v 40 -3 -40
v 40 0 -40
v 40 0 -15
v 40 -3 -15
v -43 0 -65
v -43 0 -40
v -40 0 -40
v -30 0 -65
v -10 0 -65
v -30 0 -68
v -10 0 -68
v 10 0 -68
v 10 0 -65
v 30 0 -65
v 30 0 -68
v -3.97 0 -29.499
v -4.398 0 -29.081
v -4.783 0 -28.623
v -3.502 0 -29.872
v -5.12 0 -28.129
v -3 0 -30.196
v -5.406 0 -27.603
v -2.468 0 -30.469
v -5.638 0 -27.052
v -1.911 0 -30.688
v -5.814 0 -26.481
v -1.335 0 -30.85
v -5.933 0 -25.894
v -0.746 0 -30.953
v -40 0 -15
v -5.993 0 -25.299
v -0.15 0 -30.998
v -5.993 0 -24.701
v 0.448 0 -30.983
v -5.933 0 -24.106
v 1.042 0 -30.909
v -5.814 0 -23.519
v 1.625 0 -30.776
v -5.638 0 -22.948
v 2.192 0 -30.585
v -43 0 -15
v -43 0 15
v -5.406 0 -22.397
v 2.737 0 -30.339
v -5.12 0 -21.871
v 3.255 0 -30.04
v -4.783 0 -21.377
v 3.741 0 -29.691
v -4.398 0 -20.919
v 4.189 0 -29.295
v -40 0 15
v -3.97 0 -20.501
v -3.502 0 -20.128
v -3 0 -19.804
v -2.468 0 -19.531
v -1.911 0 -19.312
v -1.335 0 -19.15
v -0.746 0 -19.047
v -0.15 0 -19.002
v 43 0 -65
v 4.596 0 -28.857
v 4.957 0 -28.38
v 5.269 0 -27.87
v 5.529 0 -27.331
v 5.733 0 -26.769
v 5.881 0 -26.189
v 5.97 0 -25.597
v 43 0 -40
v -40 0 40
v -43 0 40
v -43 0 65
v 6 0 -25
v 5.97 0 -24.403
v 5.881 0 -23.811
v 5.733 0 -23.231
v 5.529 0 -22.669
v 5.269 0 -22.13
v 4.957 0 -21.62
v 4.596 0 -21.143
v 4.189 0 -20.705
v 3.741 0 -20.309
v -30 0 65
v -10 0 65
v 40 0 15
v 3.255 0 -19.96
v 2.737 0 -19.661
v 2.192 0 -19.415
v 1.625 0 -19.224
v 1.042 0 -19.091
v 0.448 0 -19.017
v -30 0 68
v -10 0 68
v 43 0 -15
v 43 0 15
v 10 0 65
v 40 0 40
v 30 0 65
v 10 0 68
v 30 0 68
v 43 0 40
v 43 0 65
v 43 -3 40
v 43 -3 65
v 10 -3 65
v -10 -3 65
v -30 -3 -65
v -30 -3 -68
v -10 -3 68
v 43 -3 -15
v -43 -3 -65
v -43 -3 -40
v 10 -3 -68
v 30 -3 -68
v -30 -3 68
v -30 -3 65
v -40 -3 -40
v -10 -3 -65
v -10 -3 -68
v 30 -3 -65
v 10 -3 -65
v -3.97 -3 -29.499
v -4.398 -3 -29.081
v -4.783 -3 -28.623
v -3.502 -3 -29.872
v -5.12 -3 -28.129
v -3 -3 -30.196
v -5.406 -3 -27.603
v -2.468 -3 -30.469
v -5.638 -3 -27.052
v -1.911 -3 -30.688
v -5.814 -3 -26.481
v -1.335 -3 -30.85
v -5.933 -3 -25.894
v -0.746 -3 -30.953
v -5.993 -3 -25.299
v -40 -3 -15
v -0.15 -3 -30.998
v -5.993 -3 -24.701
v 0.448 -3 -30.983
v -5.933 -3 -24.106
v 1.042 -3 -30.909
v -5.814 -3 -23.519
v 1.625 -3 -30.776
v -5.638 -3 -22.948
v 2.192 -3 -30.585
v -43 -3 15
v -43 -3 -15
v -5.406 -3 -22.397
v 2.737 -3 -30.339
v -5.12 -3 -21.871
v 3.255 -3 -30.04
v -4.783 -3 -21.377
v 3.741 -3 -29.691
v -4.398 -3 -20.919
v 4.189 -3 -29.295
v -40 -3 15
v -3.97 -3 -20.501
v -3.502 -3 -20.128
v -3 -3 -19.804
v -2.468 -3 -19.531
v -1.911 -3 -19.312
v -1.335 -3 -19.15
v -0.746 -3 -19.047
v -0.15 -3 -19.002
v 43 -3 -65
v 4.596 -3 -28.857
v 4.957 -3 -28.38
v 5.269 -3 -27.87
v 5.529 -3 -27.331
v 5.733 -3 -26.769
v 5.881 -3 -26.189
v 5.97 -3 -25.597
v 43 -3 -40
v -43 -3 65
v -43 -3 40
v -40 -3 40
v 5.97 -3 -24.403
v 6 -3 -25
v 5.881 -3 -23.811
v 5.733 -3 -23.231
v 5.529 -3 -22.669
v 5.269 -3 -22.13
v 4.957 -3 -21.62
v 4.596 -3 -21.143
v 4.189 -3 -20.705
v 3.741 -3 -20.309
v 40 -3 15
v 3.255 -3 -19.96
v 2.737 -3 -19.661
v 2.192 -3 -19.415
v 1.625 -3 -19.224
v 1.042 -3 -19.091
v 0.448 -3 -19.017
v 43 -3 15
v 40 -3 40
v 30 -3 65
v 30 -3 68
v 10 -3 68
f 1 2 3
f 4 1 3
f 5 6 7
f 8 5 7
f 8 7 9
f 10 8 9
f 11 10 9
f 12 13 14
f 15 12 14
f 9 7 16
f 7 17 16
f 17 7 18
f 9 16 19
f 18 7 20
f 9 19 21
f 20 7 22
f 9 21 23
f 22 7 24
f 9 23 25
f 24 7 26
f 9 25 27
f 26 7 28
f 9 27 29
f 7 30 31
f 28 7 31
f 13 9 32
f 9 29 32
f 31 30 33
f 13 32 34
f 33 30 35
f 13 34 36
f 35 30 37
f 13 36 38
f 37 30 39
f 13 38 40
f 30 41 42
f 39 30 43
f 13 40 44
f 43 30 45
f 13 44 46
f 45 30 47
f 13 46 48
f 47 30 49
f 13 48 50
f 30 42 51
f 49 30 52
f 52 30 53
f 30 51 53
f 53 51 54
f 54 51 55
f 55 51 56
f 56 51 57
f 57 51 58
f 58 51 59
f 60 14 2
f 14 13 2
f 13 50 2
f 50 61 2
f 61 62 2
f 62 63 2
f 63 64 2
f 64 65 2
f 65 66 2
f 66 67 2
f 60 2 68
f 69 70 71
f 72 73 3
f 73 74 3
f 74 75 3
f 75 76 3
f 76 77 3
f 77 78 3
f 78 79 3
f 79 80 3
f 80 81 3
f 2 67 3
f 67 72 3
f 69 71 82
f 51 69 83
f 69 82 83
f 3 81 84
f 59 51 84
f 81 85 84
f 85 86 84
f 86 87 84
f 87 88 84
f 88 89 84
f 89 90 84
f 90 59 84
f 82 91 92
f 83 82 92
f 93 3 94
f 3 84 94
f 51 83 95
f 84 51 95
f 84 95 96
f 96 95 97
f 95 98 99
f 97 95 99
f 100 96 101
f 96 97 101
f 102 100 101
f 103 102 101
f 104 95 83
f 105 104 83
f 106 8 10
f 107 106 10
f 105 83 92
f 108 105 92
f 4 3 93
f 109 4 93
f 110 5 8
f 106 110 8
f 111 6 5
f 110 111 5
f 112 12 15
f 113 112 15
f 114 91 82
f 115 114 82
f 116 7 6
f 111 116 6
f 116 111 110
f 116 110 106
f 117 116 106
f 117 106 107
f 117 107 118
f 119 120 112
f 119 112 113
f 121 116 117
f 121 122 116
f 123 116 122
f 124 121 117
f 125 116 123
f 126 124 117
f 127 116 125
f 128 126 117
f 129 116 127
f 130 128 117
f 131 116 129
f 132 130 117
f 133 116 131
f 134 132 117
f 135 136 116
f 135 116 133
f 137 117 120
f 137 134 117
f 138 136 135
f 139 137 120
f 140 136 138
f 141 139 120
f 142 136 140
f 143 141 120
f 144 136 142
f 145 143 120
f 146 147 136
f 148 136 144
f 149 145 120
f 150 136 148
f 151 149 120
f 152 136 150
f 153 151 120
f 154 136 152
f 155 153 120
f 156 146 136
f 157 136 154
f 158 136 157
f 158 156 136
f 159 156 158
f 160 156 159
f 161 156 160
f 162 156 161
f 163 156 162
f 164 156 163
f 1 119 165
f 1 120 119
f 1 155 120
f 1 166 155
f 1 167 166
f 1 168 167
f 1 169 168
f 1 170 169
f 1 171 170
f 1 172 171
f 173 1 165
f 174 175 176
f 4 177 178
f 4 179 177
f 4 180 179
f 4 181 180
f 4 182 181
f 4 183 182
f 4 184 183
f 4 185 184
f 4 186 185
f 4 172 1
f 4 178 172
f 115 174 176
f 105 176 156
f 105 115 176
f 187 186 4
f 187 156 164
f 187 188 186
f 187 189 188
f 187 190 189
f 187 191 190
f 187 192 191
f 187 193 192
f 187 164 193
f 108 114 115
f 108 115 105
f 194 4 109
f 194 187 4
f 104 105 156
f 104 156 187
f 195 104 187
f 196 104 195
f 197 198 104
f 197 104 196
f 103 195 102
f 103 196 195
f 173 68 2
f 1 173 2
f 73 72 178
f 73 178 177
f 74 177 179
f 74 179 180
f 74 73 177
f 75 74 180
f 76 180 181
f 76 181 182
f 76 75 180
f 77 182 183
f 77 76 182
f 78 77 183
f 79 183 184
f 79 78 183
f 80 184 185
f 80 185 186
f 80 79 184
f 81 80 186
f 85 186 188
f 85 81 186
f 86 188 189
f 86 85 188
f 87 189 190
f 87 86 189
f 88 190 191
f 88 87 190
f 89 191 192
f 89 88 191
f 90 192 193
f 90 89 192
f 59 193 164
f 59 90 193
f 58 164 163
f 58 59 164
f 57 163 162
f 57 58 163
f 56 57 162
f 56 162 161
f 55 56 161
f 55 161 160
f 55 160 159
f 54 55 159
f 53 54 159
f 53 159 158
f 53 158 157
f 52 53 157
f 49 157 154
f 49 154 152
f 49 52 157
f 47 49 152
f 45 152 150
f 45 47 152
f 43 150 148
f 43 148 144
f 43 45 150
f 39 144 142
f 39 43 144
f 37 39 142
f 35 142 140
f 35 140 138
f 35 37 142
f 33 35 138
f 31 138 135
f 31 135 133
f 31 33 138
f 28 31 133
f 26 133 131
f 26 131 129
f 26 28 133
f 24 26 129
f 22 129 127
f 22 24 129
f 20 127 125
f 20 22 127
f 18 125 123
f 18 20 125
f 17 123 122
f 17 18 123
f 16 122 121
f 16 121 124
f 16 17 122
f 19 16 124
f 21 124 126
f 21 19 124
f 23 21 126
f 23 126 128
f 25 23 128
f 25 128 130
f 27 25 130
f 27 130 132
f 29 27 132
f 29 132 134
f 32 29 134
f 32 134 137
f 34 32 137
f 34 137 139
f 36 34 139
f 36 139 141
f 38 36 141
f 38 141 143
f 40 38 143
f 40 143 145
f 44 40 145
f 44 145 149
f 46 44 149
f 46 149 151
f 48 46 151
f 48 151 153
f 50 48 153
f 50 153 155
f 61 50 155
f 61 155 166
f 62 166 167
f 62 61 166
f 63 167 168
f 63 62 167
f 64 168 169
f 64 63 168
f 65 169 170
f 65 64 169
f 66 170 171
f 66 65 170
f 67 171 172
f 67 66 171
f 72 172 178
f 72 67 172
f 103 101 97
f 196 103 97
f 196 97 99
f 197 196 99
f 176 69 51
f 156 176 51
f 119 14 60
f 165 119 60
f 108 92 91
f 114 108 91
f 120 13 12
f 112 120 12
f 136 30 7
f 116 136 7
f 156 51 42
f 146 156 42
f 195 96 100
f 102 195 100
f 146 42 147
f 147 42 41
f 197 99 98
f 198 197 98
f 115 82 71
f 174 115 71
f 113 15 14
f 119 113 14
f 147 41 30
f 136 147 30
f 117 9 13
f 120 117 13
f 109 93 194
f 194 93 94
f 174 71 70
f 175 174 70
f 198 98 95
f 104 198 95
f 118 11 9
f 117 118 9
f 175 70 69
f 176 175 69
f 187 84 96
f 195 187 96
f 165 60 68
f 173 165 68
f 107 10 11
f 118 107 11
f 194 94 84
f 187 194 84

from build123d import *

# Parameters (mm, degrees)
F0_R     = 6
F1_DEPTH = 3


with BuildPart() as f1:
    # F0 (on Front) → F1 (new body)
    with BuildSketch(Plane.XZ):
        Polygon((-30, 65), (-40, 65), (-43, 65), (-43, 40), (-40, 40), (-40, 15), (-43, 15), (-43, 0), (-43, -15), (-40, -15), (-40, -40), (-43, -40), (-43, -65), (-40, -65), (-30, -65), (-30, -68), (-10, -68), (-10, -65), (0, -65), (10, -65), (10, -68), (30, -68), (30, -65), (40, -65), (43, -65), (43, -40), (40, -40), (40, -15), (43, -15), (43, 0), (43, 15), (40, 15), (40, 40), (43, 40), (43, 65), (40, 65), (30, 65), (30, 68), (10, 68), (10, 65), (0, 65), (-10, 65), (-10, 68), (-30, 68), align=None)
        with Locations((0, -25)):
            Circle(F0_R, mode=Mode.SUBTRACT)
    extrude(amount=F1_DEPTH)


solid = f1.part
